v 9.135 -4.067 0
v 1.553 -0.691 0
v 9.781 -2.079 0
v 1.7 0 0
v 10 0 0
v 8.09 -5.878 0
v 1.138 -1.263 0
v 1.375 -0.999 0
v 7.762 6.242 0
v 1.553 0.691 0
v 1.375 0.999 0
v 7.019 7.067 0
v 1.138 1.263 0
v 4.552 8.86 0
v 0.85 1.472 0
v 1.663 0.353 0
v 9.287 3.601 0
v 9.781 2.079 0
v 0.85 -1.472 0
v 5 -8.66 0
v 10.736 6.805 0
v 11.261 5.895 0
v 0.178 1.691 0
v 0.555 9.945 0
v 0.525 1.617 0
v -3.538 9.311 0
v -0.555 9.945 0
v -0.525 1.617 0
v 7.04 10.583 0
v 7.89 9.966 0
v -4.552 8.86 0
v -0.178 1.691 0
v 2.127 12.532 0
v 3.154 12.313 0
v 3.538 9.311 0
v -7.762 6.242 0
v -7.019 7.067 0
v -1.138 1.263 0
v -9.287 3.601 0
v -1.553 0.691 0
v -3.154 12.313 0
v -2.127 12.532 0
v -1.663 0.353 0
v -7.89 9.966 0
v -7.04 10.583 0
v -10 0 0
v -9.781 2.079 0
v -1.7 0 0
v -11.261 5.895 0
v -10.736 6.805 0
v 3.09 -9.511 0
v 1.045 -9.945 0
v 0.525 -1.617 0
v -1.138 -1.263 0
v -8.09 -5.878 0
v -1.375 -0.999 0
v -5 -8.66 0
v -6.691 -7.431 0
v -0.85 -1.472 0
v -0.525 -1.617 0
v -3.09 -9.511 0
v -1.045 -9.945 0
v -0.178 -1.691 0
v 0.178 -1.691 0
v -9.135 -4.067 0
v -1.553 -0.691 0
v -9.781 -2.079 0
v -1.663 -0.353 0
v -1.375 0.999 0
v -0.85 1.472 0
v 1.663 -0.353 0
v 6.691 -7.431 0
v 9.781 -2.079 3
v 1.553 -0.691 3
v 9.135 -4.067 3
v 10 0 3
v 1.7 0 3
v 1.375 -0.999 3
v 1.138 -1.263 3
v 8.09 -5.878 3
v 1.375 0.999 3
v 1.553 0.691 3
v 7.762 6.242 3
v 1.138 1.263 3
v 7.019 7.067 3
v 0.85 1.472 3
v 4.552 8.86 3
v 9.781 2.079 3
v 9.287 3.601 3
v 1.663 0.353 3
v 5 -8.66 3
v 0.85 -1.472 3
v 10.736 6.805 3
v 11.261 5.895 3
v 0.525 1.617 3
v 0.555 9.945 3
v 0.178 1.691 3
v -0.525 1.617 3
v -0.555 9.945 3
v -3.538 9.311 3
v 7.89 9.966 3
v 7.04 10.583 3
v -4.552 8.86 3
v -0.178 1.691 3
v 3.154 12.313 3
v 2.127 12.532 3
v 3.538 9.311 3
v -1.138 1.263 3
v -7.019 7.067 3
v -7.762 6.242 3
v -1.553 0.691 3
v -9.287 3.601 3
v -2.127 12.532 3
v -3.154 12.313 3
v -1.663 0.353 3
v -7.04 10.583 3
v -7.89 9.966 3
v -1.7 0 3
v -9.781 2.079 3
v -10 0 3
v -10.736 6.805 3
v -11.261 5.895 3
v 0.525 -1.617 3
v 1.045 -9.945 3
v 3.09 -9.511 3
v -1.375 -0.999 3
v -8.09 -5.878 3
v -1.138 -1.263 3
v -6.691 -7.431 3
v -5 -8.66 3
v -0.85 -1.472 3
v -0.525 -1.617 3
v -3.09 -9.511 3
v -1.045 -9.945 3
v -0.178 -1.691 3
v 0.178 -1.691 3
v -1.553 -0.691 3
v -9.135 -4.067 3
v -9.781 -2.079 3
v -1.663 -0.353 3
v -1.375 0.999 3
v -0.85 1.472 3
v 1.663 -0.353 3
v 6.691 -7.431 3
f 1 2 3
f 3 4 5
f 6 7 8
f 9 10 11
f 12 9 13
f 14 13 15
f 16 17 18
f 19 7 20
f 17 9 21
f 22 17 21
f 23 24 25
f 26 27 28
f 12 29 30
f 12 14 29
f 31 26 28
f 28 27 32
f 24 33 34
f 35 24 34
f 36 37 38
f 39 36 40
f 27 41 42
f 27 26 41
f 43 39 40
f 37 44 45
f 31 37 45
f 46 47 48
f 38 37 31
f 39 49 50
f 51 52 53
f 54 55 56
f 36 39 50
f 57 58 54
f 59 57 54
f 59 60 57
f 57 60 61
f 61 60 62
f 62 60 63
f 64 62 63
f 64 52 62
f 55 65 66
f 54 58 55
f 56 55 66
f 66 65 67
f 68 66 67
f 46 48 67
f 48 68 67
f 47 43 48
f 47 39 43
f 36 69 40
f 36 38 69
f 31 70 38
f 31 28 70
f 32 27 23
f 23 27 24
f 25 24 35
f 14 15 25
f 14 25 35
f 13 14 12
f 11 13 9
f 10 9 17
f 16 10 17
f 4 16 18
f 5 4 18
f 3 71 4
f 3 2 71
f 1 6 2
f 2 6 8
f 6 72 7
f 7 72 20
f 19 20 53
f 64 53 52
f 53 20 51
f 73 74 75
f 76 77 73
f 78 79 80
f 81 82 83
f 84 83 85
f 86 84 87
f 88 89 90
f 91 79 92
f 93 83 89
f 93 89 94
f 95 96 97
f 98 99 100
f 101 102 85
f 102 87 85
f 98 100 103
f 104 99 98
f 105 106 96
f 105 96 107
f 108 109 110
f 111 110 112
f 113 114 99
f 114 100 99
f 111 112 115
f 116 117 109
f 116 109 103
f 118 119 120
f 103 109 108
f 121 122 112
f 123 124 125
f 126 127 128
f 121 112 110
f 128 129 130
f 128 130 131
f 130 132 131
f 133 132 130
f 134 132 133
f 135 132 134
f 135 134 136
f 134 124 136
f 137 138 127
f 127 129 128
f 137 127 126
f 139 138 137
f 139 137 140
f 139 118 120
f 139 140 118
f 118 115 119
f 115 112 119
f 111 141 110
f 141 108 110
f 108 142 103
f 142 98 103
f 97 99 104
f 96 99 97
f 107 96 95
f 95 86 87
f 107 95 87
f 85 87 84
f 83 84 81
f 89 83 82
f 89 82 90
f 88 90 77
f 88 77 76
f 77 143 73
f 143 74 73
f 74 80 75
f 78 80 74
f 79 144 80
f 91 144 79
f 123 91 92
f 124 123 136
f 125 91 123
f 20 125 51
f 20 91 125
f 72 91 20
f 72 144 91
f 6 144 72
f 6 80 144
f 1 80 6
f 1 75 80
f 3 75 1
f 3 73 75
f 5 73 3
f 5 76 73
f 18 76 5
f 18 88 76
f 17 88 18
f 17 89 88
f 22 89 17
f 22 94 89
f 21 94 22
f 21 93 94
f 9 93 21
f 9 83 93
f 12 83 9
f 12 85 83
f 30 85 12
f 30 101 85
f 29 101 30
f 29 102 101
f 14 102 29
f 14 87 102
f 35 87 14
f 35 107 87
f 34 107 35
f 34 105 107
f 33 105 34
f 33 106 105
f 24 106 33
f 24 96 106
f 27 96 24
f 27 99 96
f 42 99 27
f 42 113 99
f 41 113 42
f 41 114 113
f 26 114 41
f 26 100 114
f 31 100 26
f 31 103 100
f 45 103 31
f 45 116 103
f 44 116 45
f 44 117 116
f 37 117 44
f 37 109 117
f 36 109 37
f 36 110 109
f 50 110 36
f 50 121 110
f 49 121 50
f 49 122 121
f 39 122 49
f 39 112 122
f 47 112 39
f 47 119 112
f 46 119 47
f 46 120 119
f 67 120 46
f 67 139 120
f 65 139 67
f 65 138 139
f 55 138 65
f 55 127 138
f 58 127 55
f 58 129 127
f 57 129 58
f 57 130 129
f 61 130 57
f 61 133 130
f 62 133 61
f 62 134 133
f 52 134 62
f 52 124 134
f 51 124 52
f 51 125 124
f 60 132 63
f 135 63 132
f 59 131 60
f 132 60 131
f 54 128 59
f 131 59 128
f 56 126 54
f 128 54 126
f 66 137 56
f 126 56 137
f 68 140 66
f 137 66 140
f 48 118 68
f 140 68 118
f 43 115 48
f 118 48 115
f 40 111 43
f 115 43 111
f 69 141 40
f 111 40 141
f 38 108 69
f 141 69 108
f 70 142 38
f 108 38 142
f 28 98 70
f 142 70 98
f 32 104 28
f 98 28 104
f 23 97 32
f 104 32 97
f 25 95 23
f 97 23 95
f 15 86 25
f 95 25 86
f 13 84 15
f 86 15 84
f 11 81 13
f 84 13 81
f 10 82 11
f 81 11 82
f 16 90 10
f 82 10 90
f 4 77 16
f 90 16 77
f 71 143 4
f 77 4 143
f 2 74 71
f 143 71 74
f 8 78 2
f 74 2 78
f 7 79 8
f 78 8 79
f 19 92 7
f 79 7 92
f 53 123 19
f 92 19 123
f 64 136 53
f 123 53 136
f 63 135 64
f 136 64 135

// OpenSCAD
module 2d_gear(r, teeth, angle, start_angle) {
    circle(r=r);
    for (i = [start_angle:360/teeth:angle+start_angle])
    rotate([0,0,i])
    translate([r,0,0]) {
        children();
    }
}

module gear(r, h, teeth, center_r = 0, angle = 360, start_angle = 0) {
    linear_extrude(height=h)
    difference() {
        2d_gear(r=r, teeth=teeth, angle=angle, start_angle=start_angle) {
            scale([2,0.7,1] * r*1.5 / 10)
            translate([-0.1,1.5,0])
            rotate([0,0,-90])
            polygon([
                [0,0],
                [1,1],
                [2,1],
                [3,0],
            ]);
            
        }
        circle(r=center_r, $fn=30);
    }
}

 gear(r=10, h=3, teeth=15, center_r = 3/2+0.2, angle = 180-30*2, start_angle = 30);
